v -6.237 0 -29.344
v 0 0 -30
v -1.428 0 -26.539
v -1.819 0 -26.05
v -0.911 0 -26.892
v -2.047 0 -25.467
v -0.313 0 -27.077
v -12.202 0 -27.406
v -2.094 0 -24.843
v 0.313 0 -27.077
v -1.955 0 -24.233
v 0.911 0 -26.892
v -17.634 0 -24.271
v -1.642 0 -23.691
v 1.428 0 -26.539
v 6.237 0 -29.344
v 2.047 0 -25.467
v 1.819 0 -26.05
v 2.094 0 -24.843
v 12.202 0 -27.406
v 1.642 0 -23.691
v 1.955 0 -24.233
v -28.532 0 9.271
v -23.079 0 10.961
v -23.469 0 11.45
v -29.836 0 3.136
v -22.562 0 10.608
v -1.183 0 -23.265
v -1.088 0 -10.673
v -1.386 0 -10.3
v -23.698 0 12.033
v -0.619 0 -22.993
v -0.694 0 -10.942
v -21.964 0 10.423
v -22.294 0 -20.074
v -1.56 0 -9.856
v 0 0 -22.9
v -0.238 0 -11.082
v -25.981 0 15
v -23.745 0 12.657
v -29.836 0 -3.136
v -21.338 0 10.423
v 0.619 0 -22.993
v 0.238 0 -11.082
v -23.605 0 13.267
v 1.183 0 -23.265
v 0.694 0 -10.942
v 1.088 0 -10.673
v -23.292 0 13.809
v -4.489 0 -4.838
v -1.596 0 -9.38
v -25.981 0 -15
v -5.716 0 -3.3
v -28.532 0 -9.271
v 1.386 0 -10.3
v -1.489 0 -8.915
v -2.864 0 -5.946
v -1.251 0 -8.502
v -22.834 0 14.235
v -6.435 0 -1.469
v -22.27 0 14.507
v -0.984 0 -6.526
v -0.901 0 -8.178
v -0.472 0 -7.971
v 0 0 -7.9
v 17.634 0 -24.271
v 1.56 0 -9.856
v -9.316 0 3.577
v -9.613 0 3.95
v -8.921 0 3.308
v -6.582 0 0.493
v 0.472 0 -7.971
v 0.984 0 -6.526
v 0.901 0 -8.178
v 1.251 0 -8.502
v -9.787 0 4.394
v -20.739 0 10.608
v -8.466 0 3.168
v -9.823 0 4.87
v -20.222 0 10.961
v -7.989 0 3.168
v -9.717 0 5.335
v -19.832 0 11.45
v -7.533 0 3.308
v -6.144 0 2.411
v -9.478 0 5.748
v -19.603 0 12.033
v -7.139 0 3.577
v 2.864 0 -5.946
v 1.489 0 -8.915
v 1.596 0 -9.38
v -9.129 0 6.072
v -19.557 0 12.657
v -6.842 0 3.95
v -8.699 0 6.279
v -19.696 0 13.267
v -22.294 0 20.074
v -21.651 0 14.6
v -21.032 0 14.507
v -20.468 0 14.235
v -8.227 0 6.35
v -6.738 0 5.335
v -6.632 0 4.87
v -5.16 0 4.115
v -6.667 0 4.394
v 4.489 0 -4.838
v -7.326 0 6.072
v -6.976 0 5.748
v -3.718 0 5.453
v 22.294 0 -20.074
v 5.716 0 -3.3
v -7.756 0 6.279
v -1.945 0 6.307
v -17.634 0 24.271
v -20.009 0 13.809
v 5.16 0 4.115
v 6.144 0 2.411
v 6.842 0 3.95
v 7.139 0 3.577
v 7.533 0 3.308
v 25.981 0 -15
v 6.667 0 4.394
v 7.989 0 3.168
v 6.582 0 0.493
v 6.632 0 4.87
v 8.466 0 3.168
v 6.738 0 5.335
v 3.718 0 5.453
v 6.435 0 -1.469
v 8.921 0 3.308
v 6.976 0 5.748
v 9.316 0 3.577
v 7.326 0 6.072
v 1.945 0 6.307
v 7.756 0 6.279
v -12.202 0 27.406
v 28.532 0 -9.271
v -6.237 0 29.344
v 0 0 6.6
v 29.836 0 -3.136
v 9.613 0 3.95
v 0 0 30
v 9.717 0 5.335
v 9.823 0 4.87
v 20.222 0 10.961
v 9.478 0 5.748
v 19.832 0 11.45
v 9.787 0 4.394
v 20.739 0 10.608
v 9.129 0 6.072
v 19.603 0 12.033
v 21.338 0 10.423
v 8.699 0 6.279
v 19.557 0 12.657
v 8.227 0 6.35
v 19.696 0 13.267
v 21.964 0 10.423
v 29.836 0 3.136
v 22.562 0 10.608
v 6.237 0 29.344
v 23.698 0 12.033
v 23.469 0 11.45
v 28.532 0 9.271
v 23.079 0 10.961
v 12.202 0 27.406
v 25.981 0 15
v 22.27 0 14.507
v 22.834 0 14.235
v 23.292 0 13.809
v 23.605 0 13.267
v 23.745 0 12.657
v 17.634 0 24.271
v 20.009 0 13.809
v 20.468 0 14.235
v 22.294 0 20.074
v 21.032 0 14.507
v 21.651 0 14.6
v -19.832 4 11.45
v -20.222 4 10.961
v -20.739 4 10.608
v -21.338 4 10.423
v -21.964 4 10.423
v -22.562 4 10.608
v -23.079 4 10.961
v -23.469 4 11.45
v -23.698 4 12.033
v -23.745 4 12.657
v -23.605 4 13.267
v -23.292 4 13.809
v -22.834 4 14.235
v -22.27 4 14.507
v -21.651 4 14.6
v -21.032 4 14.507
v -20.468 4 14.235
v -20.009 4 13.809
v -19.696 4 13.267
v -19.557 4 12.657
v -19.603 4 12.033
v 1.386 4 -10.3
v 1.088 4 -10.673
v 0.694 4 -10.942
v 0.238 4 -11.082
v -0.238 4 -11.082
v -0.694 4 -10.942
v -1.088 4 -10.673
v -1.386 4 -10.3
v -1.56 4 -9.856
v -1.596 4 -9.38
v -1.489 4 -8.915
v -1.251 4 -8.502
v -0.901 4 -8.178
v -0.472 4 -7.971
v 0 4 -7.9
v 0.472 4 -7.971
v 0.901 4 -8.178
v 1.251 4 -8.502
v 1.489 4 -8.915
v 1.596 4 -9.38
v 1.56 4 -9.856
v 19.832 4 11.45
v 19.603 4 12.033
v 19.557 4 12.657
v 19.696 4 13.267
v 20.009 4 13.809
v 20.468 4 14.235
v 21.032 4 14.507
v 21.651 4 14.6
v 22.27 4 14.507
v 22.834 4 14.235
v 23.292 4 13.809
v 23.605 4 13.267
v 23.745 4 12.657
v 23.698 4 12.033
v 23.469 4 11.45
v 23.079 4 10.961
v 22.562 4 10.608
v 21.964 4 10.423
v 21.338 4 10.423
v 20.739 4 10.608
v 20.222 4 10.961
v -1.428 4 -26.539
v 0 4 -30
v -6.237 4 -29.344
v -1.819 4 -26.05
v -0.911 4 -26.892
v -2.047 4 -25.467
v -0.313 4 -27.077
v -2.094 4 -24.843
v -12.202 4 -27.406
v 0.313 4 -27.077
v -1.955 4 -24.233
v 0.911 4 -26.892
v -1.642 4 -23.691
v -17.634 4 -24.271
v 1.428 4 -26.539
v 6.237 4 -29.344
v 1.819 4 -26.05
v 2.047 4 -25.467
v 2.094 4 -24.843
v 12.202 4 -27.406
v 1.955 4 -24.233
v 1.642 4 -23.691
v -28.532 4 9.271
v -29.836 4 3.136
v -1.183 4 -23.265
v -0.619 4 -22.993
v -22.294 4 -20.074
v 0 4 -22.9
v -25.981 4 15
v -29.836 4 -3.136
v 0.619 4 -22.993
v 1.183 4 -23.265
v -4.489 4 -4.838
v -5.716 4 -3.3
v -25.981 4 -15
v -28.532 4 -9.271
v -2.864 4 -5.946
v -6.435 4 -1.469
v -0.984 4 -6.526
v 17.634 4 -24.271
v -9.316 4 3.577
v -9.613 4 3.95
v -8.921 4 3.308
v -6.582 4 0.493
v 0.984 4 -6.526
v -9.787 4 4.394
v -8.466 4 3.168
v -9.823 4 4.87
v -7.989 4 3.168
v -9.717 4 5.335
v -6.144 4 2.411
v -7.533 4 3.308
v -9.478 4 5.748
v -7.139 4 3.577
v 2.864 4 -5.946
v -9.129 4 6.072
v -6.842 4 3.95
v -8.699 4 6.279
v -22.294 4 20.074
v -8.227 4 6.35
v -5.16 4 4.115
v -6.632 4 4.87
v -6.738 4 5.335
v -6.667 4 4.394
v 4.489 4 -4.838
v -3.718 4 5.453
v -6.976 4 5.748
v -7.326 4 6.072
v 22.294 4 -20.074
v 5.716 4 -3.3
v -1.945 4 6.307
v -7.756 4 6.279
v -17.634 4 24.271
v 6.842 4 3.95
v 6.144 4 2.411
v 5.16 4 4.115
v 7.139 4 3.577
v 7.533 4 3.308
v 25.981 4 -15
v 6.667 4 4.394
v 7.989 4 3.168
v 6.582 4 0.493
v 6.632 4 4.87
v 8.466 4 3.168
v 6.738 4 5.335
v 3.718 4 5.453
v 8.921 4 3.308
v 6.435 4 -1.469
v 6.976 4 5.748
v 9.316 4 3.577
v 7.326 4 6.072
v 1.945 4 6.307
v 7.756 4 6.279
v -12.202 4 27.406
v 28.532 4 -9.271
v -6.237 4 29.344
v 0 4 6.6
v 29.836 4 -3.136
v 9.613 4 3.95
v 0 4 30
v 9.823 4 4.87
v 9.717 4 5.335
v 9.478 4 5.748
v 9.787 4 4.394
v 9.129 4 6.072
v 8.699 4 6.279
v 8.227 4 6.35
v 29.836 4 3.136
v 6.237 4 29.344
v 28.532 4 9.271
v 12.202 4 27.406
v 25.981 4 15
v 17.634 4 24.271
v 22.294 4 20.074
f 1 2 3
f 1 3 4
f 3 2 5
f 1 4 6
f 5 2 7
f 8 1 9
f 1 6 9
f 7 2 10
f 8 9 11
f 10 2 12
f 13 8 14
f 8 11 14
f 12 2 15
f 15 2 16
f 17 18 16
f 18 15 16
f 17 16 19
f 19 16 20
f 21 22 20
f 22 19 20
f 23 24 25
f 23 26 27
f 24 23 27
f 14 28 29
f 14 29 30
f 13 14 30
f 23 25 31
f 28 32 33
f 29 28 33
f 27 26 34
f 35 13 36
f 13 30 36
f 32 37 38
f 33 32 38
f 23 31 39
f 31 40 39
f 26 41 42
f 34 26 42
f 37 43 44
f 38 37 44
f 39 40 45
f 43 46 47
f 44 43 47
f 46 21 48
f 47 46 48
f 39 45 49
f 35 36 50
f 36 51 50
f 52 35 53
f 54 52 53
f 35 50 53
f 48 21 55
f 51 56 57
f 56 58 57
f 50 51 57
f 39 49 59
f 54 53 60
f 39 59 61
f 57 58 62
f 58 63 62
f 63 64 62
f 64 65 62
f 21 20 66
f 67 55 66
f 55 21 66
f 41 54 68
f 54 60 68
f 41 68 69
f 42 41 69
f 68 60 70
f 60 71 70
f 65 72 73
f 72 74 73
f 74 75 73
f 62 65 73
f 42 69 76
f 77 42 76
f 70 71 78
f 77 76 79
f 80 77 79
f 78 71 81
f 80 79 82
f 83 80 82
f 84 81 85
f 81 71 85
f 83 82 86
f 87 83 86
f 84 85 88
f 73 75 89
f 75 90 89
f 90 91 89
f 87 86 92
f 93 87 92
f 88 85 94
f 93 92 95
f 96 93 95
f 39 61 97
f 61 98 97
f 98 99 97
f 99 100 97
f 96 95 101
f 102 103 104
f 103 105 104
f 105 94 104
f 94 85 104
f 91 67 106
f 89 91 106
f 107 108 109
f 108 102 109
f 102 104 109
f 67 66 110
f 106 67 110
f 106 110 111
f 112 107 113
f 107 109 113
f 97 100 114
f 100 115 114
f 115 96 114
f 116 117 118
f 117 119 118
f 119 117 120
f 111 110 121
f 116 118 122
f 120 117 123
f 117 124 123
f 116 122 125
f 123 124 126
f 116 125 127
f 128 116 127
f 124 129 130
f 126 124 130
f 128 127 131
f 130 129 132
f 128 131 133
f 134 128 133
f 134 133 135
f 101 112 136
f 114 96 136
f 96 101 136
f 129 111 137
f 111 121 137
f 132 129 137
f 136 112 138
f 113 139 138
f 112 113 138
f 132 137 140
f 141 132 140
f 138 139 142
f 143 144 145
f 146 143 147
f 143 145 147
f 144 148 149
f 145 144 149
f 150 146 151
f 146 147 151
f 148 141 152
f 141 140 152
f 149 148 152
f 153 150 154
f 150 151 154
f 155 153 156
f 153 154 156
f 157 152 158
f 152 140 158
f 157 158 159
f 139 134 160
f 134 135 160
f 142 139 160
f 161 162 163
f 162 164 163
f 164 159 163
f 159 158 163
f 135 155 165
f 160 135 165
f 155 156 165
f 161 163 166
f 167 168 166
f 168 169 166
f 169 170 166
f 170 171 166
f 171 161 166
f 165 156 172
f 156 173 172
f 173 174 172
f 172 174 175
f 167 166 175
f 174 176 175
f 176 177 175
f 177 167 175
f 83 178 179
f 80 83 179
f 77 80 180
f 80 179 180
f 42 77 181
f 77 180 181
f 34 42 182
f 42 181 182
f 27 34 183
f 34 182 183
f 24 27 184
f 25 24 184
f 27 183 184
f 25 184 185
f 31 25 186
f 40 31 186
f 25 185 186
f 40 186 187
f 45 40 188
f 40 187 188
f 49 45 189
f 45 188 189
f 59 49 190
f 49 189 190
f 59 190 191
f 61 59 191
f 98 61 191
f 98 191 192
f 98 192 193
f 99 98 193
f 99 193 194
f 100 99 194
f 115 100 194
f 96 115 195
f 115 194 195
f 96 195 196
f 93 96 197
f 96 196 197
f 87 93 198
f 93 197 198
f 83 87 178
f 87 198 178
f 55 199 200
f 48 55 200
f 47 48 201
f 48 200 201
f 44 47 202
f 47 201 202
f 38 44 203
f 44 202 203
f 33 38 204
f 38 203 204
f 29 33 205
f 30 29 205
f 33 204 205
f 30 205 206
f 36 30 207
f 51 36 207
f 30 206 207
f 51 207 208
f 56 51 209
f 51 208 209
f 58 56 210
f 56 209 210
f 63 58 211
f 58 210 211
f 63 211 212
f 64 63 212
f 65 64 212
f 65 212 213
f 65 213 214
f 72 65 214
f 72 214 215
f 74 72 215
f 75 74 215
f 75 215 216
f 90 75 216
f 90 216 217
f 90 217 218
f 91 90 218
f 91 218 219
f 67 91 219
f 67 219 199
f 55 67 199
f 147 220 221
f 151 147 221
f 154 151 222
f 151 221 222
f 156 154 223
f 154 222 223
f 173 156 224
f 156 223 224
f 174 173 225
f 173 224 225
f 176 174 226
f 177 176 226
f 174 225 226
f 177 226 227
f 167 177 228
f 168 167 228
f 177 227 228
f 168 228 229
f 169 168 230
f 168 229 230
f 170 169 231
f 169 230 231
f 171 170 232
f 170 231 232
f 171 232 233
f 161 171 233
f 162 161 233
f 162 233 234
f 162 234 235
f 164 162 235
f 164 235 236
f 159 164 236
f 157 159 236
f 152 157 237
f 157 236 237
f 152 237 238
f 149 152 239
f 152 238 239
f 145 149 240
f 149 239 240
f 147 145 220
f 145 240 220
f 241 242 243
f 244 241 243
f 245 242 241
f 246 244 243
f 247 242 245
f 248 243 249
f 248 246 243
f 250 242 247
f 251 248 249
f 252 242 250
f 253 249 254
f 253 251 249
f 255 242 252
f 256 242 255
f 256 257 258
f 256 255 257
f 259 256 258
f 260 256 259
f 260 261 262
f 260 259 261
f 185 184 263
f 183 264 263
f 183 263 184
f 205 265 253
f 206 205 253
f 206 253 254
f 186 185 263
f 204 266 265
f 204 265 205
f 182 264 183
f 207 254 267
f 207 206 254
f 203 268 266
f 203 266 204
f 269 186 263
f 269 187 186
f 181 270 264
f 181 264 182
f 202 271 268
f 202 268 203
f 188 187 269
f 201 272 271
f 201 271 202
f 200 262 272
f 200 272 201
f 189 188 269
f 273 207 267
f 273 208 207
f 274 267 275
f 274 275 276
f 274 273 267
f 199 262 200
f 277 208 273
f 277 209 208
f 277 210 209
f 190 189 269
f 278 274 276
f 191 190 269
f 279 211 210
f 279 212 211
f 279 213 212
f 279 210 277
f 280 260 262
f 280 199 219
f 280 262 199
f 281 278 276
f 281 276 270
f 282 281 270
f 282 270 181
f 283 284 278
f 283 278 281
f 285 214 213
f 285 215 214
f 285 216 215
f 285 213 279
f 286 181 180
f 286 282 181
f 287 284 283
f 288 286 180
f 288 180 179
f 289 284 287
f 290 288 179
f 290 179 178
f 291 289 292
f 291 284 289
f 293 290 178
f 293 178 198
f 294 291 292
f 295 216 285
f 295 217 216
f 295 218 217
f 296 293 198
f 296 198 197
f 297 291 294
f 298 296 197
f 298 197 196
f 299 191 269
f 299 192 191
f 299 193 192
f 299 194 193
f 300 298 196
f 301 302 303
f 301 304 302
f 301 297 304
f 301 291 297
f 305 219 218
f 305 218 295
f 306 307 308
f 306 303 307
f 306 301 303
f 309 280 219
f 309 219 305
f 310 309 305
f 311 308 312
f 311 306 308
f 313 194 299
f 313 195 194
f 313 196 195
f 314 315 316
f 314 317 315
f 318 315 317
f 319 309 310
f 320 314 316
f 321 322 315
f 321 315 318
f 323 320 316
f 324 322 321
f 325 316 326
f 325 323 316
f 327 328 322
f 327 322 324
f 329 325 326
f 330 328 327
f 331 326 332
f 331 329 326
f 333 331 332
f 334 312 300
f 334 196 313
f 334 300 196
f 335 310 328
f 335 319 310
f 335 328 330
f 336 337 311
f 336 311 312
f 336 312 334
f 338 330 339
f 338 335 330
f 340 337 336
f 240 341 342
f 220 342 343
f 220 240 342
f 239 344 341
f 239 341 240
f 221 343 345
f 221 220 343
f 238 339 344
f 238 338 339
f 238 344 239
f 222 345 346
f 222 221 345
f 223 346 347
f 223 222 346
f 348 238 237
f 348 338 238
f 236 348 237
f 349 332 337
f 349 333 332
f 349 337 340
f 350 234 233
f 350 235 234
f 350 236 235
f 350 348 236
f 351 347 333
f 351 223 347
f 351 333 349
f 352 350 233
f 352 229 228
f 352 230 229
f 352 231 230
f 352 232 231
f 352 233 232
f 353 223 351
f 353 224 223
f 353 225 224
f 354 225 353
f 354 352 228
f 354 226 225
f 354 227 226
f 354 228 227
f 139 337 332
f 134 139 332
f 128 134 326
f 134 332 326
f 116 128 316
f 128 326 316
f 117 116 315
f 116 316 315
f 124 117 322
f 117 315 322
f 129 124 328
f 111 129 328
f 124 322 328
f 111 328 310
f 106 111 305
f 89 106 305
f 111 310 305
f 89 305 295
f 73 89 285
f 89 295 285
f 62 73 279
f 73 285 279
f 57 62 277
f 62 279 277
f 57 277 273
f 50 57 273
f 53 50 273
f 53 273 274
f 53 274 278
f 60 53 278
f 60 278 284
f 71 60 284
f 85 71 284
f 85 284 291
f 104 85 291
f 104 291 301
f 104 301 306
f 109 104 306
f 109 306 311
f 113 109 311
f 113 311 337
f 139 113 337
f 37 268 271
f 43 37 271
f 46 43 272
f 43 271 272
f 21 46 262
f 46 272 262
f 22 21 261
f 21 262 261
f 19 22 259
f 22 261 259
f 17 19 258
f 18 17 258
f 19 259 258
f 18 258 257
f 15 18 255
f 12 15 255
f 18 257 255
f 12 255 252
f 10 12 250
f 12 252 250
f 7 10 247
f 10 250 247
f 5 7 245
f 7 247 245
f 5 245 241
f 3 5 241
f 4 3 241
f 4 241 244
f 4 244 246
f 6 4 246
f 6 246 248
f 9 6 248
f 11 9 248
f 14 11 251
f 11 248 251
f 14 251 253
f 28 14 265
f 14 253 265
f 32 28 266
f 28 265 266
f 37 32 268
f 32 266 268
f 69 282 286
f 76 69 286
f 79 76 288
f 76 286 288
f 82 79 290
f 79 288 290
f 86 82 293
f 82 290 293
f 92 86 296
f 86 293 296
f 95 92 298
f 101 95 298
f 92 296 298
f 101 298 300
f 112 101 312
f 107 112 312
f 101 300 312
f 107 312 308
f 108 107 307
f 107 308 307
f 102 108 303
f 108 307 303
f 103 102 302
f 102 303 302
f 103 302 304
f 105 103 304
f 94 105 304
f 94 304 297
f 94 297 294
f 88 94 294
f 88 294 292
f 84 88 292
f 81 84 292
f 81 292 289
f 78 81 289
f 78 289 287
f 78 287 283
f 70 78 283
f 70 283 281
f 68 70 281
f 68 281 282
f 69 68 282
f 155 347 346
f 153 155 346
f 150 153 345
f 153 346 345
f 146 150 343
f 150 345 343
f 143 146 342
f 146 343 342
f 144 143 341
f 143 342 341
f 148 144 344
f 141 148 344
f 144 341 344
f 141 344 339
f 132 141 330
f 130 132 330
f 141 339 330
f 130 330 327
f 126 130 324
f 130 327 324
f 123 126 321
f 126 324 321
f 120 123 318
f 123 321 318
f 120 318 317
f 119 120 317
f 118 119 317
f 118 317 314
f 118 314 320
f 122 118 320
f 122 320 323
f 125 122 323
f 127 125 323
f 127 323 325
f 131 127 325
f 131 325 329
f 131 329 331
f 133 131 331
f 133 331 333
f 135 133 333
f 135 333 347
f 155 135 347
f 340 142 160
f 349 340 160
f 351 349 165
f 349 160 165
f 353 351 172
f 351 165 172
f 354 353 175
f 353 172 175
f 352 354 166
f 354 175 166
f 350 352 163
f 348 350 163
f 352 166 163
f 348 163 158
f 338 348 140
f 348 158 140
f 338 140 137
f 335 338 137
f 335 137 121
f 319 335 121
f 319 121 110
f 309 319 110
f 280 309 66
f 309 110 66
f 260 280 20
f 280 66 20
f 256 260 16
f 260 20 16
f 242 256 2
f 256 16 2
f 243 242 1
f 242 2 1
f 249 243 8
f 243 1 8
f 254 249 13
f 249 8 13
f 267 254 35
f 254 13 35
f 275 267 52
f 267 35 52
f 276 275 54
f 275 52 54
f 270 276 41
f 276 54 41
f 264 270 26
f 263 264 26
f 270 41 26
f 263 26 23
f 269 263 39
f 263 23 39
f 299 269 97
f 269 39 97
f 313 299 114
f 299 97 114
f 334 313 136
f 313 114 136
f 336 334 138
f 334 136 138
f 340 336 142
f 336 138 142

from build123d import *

# Parameters (mm, degrees)
SKETCH_1_R               = 30
EXTRUDE_1_DEPTH          = 4
SKETCH_2_R               = 2.1
CUT_EXTRUDE_1_DEPTH      = 4
PATTERN_CIRCULAR_1_COUNT = 3
SKETCH_3_R               = 6.6
CUT_EXTRUDE_2_DEPTH      = 17
SKETCH_4_R               = 1.6
CUT_EXTRUDE_3_DEPTH      = 17
PATTERN_CIRCULAR_2_COUNT = 3


with BuildPart() as part:
    # 草图1 → 凸台-拉伸1 (new body)
    with BuildSketch(Plane(origin=(0, 0, 0), x_dir=(1, 0, 0), z_dir=(0, 1, 0))):
        with Locations(Location((0, 0, 0), (0, 0, 270))):
            Circle(SKETCH_1_R)
    extrude(amount=EXTRUDE_1_DEPTH)

    # 草图2 → 切除-拉伸1 (cut)
    with BuildSketch(Plane(origin=(0, 4, 0), x_dir=(1, 0, 0), z_dir=(0, 1, 0))):
        with Locations(Location((0, 25, 0), (0, 0, 270))):
            Circle(SKETCH_2_R)
    cut_extrude_1 = extrude(amount=-CUT_EXTRUDE_1_DEPTH, mode=Mode.SUBTRACT)

    # 阵列(圆周)1: 切除-拉伸1 ×3 about axis
    pattern_circular_1_axis = Axis((0, 0, 0), (0, 1, 0))
    for i in range(1, PATTERN_CIRCULAR_1_COUNT):
        add(cut_extrude_1.rotate(pattern_circular_1_axis, i * 360 / PATTERN_CIRCULAR_1_COUNT), mode=Mode.SUBTRACT)

    # 草图3 → 切除-拉伸2 (cut)
    with BuildSketch(Plane(origin=(0, 4, 0), x_dir=(1, 0, 0), z_dir=(0, 1, 0))):
        with Locations(Location((0, 0, 0), (0, 0, 270))):
            Circle(SKETCH_3_R)
    extrude(amount=-CUT_EXTRUDE_2_DEPTH, mode=Mode.SUBTRACT)

    # 草图4 → 切除-拉伸3 (cut)
    with BuildSketch(Plane(origin=(0, 4, 0), x_dir=(1, 0, 0), z_dir=(0, 1, 0))):
        with Locations(Location((8.227241336, -4.75, 0), (0, 0, 270))):
            Circle(SKETCH_4_R)
    cut_extrude_3 = extrude(amount=-CUT_EXTRUDE_3_DEPTH, mode=Mode.SUBTRACT)

    # 阵列(圆周)2: 切除-拉伸3 ×3 about axis
    pattern_circular_2_axis = Axis((0, 0, 0), (0, 1, 0))
    for i in range(1, PATTERN_CIRCULAR_2_COUNT):
        add(cut_extrude_3.rotate(pattern_circular_2_axis, i * 360 / PATTERN_CIRCULAR_2_COUNT), mode=Mode.SUBTRACT)


solid = part.part
